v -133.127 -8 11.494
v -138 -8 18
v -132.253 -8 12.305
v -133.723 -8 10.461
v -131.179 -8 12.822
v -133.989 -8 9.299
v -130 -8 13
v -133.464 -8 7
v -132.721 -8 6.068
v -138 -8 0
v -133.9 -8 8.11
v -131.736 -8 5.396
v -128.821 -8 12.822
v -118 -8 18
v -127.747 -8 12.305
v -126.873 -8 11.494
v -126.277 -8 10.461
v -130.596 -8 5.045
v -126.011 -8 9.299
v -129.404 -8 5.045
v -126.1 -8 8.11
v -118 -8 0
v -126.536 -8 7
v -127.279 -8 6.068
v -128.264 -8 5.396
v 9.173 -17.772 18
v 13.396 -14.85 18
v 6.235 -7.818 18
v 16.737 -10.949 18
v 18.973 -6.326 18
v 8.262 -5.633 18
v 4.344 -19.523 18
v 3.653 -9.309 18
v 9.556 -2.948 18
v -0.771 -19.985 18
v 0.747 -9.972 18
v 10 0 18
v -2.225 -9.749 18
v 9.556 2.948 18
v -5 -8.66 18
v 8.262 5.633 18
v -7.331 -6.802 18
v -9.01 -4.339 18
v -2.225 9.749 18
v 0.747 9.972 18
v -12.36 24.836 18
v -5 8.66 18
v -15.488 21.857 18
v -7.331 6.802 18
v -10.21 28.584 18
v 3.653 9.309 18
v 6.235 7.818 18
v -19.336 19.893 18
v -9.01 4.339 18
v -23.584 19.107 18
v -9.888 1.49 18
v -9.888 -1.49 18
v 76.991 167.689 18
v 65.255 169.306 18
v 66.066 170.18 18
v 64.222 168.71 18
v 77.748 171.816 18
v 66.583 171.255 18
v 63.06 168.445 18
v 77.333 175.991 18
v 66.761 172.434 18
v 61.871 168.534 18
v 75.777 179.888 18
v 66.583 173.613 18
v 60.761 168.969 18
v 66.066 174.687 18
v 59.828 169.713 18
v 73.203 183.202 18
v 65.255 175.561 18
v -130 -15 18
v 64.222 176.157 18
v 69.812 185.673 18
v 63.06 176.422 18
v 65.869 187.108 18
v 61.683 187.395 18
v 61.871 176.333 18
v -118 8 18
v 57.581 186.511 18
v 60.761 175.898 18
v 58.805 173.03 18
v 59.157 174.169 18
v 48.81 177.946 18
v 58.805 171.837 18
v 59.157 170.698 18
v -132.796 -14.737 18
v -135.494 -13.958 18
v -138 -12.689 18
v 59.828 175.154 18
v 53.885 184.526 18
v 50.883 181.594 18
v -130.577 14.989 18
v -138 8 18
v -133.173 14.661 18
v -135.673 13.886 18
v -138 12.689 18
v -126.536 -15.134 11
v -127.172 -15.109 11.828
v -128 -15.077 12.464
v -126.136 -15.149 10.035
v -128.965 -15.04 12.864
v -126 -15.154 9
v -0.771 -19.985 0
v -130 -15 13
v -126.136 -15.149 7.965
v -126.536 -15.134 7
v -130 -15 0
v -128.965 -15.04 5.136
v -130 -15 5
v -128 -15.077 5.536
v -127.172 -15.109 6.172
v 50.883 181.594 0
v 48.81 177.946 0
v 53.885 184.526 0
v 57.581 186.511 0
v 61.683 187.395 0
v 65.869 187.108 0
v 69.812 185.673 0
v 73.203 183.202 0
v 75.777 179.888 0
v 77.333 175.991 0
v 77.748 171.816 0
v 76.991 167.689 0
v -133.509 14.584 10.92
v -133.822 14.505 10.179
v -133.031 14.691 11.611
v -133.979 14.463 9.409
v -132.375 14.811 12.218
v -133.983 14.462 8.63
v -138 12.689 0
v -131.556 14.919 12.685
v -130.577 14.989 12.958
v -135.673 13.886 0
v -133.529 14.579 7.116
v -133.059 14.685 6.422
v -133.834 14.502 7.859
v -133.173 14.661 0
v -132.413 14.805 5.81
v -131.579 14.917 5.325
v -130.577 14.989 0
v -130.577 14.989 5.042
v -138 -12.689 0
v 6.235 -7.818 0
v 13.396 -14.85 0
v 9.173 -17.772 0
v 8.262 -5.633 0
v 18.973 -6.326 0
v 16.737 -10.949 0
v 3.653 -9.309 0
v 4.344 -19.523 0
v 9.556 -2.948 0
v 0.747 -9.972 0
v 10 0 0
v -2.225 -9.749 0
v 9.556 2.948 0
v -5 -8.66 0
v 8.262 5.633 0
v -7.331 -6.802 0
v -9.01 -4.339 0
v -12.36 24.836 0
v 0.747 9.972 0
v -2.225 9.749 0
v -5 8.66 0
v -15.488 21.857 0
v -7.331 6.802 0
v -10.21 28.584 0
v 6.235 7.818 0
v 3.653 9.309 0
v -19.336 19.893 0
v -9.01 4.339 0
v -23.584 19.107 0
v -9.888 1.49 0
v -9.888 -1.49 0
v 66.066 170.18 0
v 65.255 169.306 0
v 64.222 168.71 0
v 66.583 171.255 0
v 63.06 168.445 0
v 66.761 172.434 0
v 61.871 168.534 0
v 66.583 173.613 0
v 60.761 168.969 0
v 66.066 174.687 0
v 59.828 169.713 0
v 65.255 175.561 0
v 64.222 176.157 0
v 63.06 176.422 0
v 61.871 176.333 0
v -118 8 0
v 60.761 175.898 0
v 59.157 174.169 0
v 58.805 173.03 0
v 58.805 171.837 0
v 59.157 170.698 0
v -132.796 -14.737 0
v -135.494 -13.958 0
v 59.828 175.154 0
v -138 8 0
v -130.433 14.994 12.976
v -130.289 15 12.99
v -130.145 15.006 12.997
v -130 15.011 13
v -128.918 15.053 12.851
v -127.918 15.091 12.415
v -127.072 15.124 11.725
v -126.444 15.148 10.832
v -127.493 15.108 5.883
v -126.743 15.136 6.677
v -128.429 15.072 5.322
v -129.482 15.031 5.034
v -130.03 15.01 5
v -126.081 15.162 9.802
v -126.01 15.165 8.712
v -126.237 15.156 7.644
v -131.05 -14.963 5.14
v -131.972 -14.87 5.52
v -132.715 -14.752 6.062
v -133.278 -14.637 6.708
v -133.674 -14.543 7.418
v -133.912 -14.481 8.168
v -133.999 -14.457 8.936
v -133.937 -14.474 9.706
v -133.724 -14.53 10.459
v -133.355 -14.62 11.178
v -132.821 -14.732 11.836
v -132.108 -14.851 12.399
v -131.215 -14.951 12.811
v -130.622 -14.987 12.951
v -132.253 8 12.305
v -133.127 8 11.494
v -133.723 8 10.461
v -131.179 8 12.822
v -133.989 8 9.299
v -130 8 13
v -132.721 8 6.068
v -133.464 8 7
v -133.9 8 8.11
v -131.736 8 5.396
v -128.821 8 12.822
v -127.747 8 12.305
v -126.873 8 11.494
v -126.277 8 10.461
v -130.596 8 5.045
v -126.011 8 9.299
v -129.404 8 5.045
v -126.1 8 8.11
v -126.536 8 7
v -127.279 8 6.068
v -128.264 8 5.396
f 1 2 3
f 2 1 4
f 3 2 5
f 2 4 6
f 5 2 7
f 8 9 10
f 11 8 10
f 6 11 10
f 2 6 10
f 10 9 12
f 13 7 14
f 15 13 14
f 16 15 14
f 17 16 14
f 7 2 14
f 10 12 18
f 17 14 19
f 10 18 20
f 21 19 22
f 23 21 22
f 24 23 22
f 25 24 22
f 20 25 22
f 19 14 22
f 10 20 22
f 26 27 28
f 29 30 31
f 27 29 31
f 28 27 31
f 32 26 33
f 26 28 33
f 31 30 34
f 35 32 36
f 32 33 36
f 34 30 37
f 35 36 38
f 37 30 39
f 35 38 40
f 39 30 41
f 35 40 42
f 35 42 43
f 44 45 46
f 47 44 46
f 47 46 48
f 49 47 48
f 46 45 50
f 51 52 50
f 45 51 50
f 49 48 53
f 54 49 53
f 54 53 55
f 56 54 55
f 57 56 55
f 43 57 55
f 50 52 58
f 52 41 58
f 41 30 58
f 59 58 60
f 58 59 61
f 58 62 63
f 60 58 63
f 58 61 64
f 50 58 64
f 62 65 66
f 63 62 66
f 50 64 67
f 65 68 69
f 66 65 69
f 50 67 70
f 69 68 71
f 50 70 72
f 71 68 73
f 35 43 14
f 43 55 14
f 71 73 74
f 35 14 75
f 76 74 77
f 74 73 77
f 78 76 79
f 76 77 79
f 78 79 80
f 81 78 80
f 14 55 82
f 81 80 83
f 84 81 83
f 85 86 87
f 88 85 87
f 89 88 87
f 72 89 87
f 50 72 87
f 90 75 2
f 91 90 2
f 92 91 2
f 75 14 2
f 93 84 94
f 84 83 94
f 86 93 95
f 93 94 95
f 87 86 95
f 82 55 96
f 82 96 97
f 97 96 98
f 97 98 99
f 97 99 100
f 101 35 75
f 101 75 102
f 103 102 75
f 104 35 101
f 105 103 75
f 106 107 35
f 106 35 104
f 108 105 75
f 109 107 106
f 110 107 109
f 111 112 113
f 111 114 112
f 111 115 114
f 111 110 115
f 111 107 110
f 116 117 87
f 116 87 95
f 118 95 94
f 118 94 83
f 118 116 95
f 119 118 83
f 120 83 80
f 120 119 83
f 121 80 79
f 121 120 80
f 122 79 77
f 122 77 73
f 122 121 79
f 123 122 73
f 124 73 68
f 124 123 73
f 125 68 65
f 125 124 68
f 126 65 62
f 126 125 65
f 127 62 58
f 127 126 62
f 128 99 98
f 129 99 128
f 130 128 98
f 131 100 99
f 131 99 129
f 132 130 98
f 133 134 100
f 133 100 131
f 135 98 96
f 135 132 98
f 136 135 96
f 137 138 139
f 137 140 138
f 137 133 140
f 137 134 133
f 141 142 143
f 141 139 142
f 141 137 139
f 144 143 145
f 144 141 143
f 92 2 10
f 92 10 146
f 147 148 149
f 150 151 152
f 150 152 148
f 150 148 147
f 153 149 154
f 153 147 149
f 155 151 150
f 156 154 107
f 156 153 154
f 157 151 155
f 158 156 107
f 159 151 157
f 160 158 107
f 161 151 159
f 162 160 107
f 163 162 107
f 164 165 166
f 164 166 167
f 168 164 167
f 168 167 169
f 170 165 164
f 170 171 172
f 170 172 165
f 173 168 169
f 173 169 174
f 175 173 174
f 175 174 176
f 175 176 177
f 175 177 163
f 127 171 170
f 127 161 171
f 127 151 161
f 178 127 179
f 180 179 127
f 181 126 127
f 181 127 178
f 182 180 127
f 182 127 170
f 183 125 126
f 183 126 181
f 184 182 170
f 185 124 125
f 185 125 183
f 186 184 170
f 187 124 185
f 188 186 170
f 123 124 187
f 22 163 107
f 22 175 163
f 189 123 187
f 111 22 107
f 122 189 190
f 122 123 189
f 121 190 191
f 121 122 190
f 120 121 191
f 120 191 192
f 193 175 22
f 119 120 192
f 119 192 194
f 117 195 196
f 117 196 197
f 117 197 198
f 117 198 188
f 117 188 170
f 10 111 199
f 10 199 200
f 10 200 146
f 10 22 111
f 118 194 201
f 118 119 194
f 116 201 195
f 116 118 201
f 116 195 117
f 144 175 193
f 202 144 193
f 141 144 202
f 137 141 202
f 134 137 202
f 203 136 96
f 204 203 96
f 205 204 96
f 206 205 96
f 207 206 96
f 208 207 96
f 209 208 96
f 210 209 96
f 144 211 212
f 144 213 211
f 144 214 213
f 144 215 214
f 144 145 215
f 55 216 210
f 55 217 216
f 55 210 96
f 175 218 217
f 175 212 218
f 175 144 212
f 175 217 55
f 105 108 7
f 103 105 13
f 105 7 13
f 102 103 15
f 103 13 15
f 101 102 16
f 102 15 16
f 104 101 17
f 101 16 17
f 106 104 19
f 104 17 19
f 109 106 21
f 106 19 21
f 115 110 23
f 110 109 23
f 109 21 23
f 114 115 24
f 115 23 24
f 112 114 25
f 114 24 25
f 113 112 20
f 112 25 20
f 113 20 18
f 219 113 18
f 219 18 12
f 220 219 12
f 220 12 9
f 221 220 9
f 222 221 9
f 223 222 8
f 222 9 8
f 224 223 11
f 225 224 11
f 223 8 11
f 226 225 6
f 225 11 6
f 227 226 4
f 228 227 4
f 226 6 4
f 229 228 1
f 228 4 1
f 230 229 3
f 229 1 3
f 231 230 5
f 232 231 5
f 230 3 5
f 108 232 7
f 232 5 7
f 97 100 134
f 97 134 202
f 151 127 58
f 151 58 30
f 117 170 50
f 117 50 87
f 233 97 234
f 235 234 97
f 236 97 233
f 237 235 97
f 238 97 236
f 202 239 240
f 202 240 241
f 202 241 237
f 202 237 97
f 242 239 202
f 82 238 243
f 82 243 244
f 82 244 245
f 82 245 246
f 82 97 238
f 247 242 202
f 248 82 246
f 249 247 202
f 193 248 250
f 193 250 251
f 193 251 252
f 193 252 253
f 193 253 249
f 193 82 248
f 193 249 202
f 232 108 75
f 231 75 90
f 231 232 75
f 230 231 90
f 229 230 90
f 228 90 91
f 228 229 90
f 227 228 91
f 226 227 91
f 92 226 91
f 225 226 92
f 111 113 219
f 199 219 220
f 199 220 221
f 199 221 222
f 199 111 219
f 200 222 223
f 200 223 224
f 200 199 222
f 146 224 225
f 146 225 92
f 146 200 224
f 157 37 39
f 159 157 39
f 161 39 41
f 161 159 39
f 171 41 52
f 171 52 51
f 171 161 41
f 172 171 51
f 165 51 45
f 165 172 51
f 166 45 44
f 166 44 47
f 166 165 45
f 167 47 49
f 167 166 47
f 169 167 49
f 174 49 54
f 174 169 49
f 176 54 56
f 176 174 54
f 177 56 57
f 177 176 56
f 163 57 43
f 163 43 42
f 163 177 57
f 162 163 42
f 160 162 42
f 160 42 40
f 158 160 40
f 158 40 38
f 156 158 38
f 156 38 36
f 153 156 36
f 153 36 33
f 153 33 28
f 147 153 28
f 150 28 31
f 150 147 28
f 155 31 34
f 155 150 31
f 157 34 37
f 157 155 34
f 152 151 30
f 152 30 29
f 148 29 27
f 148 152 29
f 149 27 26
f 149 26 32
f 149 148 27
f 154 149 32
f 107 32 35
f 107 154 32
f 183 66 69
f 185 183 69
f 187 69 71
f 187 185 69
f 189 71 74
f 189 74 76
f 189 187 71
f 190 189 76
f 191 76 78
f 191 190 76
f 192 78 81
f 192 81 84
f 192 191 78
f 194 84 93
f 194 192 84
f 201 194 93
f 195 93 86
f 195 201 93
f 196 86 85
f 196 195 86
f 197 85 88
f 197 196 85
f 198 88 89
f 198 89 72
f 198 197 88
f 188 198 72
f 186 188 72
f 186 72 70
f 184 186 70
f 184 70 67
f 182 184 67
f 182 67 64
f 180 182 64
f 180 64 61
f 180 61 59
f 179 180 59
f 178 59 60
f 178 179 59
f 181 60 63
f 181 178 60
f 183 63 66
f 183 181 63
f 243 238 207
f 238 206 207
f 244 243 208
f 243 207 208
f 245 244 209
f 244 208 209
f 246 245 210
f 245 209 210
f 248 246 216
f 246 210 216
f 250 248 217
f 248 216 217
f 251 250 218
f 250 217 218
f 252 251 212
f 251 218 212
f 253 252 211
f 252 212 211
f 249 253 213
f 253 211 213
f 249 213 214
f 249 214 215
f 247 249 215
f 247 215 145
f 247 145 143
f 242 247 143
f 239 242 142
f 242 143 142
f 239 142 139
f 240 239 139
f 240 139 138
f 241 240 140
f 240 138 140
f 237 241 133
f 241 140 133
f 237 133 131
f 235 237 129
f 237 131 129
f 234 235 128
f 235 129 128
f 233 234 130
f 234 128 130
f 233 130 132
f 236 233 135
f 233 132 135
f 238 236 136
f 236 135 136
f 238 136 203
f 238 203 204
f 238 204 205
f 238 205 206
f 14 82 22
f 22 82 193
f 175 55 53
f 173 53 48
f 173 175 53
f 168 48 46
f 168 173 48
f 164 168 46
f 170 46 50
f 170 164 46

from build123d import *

# Parameters (mm, degrees)
EXTRUDE_1_DEPTH     = 18
SKETCH_3_R          = 10
SKETCH_3_R_2        = 4
CUT_EXTRUDE_1_DEPTH = 18
SKETCH_4_R          = 4
CUT_EXTRUDE_2_DEPTH = 20
CUT_EXTRUDE_START   = 12
SKETCH_5_W          = 18
SKETCH_5_H          = 16
CUT_EXTRUDE_3_DEPTH = 28
CUT_EXTRUDE_5_DEPTH = 18


with BuildPart() as part:
    # 草图1 → 凸台-拉伸1 (new body)
    with BuildSketch(Plane.XY):
        with BuildLine():
            Line((76.990642, 167.689269), (18.973261, -6.325769))
            ThreePointArc((18.973261, -6.325769), (11.378738, -16.447623), (-0.770942, -19.985136))
            Line((-0.770942, -19.985136), (-130.000001, -15.000028))
            ThreePointArc((-130.000001, -15.000028), (-144.997254, -0.288514), (-130.576922, 14.988929))
            Line((-130.576922, 14.988929), (-23.583521, 19.107084))
            ThreePointArc((-23.583521, 19.107084), (-15.488001, 21.857162), (-10.210075, 28.583518))
            Line((-10.210075, 28.583518), (48.810331, 177.946064))
            ThreePointArc((48.810331, 177.946064), (67.890998, 186.528985), (76.990642, 167.689269))
        make_face()
    extrude(amount=EXTRUDE_1_DEPTH)

    # 草图3 → 切除-拉伸1 (cut)
    with BuildSketch(Plane.XY):
        Circle(SKETCH_3_R)
        with Locations((62.760696, 172.433596)):
            Circle(SKETCH_3_R_2)
    extrude(amount=CUT_EXTRUDE_1_DEPTH, mode=Mode.SUBTRACT)

    # 草图4 → 切除-拉伸2 (cut, symmetric)
    with BuildSketch(Plane(origin=(0, 0, 0), x_dir=(1, 0, 0), z_dir=(0, 1, 0))):
        with Locations(Location((-130, -9, 0), (0, 0, 269.999985))):
            Circle(SKETCH_4_R)
    extrude(amount=CUT_EXTRUDE_2_DEPTH, both=True, mode=Mode.SUBTRACT)

    # 草图5 → 切除-拉伸3 (cut)
    with BuildSketch(Plane(origin=(-130, 0, 0), x_dir=(0, 0, -1), z_dir=(1, 0, 0)).offset(CUT_EXTRUDE_START)):
        with Locations((-9, 0)):
            Rectangle(SKETCH_5_W, SKETCH_5_H)
    extrude(amount=-CUT_EXTRUDE_3_DEPTH, mode=Mode.SUBTRACT)

    # 草图8 → 切除-拉伸5 (cut)
    with BuildSketch(Plane.XY):
        Polygon((-145.000001, 0), (-145.000001, 20), (-138.000001, 20), (-138.000001, -20), (-145.000001, -20), align=None)
    extrude(amount=CUT_EXTRUDE_5_DEPTH, mode=Mode.SUBTRACT)


solid = part.part
